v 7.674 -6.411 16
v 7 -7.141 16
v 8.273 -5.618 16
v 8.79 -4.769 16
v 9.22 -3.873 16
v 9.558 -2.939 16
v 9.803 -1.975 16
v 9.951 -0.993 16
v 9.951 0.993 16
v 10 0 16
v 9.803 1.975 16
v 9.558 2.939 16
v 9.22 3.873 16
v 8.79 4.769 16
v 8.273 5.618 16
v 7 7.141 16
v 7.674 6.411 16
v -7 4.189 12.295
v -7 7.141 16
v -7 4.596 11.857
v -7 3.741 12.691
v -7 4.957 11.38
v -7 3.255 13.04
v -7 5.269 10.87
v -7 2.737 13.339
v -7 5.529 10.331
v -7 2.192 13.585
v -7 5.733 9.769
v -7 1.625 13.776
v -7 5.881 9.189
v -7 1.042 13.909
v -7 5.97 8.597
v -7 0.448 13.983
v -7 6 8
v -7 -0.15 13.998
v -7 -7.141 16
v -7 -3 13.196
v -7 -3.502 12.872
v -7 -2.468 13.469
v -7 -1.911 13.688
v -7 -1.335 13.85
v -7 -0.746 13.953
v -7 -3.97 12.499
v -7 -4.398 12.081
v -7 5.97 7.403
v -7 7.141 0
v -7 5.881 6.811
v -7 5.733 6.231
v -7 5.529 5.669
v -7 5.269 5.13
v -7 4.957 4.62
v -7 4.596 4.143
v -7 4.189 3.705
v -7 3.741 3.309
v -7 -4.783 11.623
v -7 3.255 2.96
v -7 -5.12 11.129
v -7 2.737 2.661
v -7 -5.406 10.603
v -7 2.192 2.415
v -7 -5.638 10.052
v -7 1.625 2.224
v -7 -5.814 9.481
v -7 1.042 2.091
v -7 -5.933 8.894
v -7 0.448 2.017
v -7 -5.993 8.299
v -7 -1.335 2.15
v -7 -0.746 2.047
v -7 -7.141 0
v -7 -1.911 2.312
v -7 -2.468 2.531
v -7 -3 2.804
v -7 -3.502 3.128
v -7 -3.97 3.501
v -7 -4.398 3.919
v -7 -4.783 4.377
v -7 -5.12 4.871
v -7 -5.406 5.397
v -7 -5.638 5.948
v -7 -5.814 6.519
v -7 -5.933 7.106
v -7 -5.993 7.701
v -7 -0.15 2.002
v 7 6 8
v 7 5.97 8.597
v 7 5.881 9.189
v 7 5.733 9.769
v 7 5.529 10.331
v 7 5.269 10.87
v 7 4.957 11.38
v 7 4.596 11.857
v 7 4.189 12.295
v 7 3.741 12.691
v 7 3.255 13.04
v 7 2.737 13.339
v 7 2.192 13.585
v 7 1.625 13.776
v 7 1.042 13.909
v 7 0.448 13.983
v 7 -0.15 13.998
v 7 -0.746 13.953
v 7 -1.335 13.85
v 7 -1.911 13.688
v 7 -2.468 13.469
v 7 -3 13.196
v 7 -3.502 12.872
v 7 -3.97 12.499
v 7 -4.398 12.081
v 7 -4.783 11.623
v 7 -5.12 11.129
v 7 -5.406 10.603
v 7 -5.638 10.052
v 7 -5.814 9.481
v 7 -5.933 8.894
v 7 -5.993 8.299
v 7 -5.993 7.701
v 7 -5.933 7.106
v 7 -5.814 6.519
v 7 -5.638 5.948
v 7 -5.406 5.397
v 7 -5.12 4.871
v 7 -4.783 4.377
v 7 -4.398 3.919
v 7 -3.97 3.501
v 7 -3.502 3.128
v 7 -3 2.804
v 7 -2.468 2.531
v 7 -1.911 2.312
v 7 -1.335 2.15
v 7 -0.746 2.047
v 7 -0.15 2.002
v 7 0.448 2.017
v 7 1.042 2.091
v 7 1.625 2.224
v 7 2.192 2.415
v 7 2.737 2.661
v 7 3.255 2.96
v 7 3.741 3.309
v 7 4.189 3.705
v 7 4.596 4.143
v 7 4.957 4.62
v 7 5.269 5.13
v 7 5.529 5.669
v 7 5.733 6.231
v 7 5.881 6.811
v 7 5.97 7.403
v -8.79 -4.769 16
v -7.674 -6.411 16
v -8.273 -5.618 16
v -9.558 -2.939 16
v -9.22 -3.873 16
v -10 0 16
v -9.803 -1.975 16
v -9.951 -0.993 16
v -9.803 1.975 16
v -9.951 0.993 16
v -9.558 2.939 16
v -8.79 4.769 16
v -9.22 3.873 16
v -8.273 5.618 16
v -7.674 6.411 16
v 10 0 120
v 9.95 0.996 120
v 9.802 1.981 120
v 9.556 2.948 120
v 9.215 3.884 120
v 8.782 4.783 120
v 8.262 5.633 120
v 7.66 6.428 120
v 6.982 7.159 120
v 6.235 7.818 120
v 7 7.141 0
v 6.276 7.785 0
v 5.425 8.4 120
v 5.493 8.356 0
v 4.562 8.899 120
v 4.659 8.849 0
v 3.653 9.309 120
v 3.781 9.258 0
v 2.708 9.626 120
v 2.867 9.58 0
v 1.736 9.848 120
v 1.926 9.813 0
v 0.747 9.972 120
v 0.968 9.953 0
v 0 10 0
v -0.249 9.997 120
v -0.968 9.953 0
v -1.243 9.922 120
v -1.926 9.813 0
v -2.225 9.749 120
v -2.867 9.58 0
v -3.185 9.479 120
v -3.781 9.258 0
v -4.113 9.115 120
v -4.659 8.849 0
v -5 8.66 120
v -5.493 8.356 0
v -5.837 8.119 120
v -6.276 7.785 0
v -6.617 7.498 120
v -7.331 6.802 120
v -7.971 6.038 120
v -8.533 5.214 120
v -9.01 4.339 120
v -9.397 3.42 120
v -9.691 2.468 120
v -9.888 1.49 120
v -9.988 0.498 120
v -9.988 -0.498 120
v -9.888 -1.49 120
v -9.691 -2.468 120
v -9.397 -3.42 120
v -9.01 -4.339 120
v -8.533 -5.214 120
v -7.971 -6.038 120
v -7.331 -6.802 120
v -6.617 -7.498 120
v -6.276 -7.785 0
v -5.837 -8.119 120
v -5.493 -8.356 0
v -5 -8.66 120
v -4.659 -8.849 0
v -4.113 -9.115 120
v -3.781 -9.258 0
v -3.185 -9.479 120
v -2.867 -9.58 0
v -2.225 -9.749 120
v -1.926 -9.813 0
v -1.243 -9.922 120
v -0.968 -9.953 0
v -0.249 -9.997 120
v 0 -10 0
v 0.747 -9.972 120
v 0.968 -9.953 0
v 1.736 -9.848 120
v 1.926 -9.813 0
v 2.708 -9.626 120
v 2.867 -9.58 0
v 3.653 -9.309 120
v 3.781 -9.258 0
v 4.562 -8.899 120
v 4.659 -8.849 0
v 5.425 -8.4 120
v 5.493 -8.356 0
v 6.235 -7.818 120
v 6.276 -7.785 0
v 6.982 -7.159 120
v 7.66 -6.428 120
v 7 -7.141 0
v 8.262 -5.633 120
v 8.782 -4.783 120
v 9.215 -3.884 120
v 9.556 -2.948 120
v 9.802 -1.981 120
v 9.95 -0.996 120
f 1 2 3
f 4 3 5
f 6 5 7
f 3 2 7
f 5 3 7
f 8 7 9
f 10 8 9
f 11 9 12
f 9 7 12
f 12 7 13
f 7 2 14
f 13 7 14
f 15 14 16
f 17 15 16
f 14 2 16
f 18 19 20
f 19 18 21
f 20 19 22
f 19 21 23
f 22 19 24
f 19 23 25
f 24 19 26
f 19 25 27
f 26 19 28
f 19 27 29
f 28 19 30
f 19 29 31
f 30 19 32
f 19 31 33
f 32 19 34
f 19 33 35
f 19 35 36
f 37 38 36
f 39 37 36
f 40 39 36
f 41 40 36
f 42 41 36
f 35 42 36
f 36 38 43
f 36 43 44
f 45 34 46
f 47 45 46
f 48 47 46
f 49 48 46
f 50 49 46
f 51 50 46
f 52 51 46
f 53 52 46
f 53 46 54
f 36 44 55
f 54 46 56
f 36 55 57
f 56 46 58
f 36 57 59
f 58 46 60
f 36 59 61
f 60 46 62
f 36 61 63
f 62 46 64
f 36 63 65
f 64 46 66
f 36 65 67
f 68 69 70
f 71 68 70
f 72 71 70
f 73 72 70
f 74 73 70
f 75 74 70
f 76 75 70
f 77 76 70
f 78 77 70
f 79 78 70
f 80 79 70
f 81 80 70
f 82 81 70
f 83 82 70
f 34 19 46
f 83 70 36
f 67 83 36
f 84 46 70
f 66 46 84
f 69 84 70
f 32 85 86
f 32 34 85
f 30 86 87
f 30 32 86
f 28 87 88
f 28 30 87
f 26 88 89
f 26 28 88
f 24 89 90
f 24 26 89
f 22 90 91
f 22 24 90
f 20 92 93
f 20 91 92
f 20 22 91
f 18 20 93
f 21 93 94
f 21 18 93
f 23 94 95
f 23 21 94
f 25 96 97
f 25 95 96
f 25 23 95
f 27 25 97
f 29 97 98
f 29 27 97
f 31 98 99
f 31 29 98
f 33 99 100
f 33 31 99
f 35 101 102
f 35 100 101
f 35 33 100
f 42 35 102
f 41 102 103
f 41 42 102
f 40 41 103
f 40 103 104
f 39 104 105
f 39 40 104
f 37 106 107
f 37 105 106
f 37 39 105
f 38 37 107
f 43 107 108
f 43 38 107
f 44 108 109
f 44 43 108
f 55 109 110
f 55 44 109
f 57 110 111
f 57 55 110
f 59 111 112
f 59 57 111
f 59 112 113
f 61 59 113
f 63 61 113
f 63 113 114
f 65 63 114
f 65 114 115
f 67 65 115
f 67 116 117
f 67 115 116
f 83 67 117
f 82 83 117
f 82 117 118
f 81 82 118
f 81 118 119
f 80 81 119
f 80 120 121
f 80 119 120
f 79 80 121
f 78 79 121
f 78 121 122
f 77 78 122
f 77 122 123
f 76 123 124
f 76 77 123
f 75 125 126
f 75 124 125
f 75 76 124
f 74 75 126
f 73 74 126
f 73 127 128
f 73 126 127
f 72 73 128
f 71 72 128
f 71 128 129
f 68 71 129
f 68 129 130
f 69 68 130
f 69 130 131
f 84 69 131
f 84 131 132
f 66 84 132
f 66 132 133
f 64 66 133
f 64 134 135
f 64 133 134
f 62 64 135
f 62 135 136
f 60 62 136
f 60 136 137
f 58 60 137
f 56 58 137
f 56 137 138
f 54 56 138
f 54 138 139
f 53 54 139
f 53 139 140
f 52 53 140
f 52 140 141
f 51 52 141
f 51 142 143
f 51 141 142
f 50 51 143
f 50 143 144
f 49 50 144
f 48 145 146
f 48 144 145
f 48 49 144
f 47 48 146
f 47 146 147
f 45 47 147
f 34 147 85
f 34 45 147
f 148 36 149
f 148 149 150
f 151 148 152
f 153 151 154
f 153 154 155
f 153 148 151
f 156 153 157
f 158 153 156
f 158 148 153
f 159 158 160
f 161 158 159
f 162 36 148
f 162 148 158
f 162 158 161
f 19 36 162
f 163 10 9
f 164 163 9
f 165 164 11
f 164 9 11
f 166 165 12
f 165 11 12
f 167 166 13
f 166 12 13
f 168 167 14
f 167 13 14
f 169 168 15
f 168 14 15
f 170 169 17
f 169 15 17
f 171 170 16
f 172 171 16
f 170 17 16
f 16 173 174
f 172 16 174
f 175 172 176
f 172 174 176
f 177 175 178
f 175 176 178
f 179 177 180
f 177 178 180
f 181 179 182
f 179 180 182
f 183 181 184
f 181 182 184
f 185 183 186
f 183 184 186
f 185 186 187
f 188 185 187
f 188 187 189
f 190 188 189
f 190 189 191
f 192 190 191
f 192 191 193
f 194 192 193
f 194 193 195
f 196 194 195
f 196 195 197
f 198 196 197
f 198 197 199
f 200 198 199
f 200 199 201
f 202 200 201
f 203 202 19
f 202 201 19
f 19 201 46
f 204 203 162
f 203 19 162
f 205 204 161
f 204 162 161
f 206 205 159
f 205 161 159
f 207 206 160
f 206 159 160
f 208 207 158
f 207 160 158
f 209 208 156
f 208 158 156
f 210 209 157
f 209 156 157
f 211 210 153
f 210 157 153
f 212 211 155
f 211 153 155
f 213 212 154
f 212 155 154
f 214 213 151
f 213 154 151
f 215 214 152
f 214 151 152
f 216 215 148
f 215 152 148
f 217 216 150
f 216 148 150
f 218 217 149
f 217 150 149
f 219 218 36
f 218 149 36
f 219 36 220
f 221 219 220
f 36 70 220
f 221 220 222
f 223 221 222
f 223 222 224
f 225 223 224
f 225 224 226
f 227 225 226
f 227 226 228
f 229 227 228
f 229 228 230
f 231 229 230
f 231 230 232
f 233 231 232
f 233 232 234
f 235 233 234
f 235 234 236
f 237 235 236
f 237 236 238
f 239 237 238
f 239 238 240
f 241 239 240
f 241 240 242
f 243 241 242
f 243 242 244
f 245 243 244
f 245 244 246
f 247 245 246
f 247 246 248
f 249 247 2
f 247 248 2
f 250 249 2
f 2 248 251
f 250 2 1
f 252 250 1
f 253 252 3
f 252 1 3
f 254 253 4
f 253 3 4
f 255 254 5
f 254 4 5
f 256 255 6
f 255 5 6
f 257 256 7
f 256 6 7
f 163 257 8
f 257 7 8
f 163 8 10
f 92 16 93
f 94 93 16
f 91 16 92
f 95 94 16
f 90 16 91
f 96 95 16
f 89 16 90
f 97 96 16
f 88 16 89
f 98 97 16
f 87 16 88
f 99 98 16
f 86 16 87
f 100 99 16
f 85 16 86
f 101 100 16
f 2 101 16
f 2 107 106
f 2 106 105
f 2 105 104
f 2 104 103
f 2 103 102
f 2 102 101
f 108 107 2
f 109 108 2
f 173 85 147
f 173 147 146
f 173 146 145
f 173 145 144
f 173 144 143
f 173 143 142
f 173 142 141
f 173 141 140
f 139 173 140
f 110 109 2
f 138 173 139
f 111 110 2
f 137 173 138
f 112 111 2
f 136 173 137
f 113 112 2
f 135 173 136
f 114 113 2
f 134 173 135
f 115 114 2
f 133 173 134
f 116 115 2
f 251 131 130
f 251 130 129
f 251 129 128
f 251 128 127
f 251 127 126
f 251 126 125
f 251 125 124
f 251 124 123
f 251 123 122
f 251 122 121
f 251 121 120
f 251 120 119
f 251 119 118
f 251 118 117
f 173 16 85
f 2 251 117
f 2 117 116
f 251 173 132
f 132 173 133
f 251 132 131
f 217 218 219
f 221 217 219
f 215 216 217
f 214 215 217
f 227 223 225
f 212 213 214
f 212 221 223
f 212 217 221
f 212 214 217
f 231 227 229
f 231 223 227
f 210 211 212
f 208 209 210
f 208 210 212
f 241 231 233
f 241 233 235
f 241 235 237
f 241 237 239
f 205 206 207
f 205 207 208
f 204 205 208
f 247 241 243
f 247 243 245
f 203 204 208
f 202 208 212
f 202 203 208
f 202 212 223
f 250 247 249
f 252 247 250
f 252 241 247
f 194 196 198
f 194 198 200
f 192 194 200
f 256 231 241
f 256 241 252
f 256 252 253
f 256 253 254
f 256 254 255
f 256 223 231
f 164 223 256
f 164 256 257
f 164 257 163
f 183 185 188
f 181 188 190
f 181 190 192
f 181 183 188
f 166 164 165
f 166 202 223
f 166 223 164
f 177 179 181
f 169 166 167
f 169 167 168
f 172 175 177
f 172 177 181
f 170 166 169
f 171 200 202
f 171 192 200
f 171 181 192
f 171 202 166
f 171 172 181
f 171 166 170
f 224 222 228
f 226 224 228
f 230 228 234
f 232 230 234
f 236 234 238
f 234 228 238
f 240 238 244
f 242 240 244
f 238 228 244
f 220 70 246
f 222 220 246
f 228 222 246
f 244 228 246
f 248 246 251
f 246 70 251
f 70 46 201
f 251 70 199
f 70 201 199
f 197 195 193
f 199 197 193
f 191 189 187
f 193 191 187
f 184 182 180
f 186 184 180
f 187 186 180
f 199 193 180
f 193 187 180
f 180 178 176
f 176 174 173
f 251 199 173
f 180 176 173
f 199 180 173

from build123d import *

# Parameters (mm, degrees)
ESQUISSE1_R                  = 10
BOSS_EXTRU_1_DEPTH           = 120
ENL_V_MAT_EXTRU_1_DEPTH      = 16
ENL_V_MAT_EXTRU_2_DEPTH      = 122.610032481
ENL_V_MAT_EXTRU_2_DEPTH_BACK = 122.610032481
ESQUISSE3_R                  = 6


with BuildPart() as part:
    # Esquisse1 → Boss.-Extru.1 (new body)
    with BuildSketch(Plane.XY):
        Circle(ESQUISSE1_R)
    extrude(amount=BOSS_EXTRU_1_DEPTH)

    # Esquisse2 → Enlèv. mat.-Extru.1 (cut)
    with BuildSketch(Plane(origin=(0, 0, 0), x_dir=(-1, 0, 0), z_dir=(0, 0, -1))):
        with BuildLine():
            Line((-7, 7.141428429), (-7, -7.141428429))
            ThreePointArc((-7, -7.141428429), (-10, 0), (-7, 7.141428429))
        make_face()
        with BuildLine():
            Line((7, 7.141428429), (7, -7.141428429))
            ThreePointArc((7, -7.141428429), (10, 0), (7, 7.141428429))
        make_face()
    extrude(amount=-ENL_V_MAT_EXTRU_1_DEPTH, mode=Mode.SUBTRACT)

    # Esquisse3 → Enlèv. mat.-Extru.2 (cut, two sides: drawn at the far end of the back side and taken through both)
    with BuildSketch(Plane(origin=(7, 0, 0), x_dir=(0, 0, -1), z_dir=(1, 0, 0)).offset(-ENL_V_MAT_EXTRU_2_DEPTH_BACK)):
        with Locations(Location((-8, 0, 0), (0, 0, 90))):
            Circle(ESQUISSE3_R)
    extrude(amount=ENL_V_MAT_EXTRU_2_DEPTH + ENL_V_MAT_EXTRU_2_DEPTH_BACK, mode=Mode.SUBTRACT)


solid = part.part
